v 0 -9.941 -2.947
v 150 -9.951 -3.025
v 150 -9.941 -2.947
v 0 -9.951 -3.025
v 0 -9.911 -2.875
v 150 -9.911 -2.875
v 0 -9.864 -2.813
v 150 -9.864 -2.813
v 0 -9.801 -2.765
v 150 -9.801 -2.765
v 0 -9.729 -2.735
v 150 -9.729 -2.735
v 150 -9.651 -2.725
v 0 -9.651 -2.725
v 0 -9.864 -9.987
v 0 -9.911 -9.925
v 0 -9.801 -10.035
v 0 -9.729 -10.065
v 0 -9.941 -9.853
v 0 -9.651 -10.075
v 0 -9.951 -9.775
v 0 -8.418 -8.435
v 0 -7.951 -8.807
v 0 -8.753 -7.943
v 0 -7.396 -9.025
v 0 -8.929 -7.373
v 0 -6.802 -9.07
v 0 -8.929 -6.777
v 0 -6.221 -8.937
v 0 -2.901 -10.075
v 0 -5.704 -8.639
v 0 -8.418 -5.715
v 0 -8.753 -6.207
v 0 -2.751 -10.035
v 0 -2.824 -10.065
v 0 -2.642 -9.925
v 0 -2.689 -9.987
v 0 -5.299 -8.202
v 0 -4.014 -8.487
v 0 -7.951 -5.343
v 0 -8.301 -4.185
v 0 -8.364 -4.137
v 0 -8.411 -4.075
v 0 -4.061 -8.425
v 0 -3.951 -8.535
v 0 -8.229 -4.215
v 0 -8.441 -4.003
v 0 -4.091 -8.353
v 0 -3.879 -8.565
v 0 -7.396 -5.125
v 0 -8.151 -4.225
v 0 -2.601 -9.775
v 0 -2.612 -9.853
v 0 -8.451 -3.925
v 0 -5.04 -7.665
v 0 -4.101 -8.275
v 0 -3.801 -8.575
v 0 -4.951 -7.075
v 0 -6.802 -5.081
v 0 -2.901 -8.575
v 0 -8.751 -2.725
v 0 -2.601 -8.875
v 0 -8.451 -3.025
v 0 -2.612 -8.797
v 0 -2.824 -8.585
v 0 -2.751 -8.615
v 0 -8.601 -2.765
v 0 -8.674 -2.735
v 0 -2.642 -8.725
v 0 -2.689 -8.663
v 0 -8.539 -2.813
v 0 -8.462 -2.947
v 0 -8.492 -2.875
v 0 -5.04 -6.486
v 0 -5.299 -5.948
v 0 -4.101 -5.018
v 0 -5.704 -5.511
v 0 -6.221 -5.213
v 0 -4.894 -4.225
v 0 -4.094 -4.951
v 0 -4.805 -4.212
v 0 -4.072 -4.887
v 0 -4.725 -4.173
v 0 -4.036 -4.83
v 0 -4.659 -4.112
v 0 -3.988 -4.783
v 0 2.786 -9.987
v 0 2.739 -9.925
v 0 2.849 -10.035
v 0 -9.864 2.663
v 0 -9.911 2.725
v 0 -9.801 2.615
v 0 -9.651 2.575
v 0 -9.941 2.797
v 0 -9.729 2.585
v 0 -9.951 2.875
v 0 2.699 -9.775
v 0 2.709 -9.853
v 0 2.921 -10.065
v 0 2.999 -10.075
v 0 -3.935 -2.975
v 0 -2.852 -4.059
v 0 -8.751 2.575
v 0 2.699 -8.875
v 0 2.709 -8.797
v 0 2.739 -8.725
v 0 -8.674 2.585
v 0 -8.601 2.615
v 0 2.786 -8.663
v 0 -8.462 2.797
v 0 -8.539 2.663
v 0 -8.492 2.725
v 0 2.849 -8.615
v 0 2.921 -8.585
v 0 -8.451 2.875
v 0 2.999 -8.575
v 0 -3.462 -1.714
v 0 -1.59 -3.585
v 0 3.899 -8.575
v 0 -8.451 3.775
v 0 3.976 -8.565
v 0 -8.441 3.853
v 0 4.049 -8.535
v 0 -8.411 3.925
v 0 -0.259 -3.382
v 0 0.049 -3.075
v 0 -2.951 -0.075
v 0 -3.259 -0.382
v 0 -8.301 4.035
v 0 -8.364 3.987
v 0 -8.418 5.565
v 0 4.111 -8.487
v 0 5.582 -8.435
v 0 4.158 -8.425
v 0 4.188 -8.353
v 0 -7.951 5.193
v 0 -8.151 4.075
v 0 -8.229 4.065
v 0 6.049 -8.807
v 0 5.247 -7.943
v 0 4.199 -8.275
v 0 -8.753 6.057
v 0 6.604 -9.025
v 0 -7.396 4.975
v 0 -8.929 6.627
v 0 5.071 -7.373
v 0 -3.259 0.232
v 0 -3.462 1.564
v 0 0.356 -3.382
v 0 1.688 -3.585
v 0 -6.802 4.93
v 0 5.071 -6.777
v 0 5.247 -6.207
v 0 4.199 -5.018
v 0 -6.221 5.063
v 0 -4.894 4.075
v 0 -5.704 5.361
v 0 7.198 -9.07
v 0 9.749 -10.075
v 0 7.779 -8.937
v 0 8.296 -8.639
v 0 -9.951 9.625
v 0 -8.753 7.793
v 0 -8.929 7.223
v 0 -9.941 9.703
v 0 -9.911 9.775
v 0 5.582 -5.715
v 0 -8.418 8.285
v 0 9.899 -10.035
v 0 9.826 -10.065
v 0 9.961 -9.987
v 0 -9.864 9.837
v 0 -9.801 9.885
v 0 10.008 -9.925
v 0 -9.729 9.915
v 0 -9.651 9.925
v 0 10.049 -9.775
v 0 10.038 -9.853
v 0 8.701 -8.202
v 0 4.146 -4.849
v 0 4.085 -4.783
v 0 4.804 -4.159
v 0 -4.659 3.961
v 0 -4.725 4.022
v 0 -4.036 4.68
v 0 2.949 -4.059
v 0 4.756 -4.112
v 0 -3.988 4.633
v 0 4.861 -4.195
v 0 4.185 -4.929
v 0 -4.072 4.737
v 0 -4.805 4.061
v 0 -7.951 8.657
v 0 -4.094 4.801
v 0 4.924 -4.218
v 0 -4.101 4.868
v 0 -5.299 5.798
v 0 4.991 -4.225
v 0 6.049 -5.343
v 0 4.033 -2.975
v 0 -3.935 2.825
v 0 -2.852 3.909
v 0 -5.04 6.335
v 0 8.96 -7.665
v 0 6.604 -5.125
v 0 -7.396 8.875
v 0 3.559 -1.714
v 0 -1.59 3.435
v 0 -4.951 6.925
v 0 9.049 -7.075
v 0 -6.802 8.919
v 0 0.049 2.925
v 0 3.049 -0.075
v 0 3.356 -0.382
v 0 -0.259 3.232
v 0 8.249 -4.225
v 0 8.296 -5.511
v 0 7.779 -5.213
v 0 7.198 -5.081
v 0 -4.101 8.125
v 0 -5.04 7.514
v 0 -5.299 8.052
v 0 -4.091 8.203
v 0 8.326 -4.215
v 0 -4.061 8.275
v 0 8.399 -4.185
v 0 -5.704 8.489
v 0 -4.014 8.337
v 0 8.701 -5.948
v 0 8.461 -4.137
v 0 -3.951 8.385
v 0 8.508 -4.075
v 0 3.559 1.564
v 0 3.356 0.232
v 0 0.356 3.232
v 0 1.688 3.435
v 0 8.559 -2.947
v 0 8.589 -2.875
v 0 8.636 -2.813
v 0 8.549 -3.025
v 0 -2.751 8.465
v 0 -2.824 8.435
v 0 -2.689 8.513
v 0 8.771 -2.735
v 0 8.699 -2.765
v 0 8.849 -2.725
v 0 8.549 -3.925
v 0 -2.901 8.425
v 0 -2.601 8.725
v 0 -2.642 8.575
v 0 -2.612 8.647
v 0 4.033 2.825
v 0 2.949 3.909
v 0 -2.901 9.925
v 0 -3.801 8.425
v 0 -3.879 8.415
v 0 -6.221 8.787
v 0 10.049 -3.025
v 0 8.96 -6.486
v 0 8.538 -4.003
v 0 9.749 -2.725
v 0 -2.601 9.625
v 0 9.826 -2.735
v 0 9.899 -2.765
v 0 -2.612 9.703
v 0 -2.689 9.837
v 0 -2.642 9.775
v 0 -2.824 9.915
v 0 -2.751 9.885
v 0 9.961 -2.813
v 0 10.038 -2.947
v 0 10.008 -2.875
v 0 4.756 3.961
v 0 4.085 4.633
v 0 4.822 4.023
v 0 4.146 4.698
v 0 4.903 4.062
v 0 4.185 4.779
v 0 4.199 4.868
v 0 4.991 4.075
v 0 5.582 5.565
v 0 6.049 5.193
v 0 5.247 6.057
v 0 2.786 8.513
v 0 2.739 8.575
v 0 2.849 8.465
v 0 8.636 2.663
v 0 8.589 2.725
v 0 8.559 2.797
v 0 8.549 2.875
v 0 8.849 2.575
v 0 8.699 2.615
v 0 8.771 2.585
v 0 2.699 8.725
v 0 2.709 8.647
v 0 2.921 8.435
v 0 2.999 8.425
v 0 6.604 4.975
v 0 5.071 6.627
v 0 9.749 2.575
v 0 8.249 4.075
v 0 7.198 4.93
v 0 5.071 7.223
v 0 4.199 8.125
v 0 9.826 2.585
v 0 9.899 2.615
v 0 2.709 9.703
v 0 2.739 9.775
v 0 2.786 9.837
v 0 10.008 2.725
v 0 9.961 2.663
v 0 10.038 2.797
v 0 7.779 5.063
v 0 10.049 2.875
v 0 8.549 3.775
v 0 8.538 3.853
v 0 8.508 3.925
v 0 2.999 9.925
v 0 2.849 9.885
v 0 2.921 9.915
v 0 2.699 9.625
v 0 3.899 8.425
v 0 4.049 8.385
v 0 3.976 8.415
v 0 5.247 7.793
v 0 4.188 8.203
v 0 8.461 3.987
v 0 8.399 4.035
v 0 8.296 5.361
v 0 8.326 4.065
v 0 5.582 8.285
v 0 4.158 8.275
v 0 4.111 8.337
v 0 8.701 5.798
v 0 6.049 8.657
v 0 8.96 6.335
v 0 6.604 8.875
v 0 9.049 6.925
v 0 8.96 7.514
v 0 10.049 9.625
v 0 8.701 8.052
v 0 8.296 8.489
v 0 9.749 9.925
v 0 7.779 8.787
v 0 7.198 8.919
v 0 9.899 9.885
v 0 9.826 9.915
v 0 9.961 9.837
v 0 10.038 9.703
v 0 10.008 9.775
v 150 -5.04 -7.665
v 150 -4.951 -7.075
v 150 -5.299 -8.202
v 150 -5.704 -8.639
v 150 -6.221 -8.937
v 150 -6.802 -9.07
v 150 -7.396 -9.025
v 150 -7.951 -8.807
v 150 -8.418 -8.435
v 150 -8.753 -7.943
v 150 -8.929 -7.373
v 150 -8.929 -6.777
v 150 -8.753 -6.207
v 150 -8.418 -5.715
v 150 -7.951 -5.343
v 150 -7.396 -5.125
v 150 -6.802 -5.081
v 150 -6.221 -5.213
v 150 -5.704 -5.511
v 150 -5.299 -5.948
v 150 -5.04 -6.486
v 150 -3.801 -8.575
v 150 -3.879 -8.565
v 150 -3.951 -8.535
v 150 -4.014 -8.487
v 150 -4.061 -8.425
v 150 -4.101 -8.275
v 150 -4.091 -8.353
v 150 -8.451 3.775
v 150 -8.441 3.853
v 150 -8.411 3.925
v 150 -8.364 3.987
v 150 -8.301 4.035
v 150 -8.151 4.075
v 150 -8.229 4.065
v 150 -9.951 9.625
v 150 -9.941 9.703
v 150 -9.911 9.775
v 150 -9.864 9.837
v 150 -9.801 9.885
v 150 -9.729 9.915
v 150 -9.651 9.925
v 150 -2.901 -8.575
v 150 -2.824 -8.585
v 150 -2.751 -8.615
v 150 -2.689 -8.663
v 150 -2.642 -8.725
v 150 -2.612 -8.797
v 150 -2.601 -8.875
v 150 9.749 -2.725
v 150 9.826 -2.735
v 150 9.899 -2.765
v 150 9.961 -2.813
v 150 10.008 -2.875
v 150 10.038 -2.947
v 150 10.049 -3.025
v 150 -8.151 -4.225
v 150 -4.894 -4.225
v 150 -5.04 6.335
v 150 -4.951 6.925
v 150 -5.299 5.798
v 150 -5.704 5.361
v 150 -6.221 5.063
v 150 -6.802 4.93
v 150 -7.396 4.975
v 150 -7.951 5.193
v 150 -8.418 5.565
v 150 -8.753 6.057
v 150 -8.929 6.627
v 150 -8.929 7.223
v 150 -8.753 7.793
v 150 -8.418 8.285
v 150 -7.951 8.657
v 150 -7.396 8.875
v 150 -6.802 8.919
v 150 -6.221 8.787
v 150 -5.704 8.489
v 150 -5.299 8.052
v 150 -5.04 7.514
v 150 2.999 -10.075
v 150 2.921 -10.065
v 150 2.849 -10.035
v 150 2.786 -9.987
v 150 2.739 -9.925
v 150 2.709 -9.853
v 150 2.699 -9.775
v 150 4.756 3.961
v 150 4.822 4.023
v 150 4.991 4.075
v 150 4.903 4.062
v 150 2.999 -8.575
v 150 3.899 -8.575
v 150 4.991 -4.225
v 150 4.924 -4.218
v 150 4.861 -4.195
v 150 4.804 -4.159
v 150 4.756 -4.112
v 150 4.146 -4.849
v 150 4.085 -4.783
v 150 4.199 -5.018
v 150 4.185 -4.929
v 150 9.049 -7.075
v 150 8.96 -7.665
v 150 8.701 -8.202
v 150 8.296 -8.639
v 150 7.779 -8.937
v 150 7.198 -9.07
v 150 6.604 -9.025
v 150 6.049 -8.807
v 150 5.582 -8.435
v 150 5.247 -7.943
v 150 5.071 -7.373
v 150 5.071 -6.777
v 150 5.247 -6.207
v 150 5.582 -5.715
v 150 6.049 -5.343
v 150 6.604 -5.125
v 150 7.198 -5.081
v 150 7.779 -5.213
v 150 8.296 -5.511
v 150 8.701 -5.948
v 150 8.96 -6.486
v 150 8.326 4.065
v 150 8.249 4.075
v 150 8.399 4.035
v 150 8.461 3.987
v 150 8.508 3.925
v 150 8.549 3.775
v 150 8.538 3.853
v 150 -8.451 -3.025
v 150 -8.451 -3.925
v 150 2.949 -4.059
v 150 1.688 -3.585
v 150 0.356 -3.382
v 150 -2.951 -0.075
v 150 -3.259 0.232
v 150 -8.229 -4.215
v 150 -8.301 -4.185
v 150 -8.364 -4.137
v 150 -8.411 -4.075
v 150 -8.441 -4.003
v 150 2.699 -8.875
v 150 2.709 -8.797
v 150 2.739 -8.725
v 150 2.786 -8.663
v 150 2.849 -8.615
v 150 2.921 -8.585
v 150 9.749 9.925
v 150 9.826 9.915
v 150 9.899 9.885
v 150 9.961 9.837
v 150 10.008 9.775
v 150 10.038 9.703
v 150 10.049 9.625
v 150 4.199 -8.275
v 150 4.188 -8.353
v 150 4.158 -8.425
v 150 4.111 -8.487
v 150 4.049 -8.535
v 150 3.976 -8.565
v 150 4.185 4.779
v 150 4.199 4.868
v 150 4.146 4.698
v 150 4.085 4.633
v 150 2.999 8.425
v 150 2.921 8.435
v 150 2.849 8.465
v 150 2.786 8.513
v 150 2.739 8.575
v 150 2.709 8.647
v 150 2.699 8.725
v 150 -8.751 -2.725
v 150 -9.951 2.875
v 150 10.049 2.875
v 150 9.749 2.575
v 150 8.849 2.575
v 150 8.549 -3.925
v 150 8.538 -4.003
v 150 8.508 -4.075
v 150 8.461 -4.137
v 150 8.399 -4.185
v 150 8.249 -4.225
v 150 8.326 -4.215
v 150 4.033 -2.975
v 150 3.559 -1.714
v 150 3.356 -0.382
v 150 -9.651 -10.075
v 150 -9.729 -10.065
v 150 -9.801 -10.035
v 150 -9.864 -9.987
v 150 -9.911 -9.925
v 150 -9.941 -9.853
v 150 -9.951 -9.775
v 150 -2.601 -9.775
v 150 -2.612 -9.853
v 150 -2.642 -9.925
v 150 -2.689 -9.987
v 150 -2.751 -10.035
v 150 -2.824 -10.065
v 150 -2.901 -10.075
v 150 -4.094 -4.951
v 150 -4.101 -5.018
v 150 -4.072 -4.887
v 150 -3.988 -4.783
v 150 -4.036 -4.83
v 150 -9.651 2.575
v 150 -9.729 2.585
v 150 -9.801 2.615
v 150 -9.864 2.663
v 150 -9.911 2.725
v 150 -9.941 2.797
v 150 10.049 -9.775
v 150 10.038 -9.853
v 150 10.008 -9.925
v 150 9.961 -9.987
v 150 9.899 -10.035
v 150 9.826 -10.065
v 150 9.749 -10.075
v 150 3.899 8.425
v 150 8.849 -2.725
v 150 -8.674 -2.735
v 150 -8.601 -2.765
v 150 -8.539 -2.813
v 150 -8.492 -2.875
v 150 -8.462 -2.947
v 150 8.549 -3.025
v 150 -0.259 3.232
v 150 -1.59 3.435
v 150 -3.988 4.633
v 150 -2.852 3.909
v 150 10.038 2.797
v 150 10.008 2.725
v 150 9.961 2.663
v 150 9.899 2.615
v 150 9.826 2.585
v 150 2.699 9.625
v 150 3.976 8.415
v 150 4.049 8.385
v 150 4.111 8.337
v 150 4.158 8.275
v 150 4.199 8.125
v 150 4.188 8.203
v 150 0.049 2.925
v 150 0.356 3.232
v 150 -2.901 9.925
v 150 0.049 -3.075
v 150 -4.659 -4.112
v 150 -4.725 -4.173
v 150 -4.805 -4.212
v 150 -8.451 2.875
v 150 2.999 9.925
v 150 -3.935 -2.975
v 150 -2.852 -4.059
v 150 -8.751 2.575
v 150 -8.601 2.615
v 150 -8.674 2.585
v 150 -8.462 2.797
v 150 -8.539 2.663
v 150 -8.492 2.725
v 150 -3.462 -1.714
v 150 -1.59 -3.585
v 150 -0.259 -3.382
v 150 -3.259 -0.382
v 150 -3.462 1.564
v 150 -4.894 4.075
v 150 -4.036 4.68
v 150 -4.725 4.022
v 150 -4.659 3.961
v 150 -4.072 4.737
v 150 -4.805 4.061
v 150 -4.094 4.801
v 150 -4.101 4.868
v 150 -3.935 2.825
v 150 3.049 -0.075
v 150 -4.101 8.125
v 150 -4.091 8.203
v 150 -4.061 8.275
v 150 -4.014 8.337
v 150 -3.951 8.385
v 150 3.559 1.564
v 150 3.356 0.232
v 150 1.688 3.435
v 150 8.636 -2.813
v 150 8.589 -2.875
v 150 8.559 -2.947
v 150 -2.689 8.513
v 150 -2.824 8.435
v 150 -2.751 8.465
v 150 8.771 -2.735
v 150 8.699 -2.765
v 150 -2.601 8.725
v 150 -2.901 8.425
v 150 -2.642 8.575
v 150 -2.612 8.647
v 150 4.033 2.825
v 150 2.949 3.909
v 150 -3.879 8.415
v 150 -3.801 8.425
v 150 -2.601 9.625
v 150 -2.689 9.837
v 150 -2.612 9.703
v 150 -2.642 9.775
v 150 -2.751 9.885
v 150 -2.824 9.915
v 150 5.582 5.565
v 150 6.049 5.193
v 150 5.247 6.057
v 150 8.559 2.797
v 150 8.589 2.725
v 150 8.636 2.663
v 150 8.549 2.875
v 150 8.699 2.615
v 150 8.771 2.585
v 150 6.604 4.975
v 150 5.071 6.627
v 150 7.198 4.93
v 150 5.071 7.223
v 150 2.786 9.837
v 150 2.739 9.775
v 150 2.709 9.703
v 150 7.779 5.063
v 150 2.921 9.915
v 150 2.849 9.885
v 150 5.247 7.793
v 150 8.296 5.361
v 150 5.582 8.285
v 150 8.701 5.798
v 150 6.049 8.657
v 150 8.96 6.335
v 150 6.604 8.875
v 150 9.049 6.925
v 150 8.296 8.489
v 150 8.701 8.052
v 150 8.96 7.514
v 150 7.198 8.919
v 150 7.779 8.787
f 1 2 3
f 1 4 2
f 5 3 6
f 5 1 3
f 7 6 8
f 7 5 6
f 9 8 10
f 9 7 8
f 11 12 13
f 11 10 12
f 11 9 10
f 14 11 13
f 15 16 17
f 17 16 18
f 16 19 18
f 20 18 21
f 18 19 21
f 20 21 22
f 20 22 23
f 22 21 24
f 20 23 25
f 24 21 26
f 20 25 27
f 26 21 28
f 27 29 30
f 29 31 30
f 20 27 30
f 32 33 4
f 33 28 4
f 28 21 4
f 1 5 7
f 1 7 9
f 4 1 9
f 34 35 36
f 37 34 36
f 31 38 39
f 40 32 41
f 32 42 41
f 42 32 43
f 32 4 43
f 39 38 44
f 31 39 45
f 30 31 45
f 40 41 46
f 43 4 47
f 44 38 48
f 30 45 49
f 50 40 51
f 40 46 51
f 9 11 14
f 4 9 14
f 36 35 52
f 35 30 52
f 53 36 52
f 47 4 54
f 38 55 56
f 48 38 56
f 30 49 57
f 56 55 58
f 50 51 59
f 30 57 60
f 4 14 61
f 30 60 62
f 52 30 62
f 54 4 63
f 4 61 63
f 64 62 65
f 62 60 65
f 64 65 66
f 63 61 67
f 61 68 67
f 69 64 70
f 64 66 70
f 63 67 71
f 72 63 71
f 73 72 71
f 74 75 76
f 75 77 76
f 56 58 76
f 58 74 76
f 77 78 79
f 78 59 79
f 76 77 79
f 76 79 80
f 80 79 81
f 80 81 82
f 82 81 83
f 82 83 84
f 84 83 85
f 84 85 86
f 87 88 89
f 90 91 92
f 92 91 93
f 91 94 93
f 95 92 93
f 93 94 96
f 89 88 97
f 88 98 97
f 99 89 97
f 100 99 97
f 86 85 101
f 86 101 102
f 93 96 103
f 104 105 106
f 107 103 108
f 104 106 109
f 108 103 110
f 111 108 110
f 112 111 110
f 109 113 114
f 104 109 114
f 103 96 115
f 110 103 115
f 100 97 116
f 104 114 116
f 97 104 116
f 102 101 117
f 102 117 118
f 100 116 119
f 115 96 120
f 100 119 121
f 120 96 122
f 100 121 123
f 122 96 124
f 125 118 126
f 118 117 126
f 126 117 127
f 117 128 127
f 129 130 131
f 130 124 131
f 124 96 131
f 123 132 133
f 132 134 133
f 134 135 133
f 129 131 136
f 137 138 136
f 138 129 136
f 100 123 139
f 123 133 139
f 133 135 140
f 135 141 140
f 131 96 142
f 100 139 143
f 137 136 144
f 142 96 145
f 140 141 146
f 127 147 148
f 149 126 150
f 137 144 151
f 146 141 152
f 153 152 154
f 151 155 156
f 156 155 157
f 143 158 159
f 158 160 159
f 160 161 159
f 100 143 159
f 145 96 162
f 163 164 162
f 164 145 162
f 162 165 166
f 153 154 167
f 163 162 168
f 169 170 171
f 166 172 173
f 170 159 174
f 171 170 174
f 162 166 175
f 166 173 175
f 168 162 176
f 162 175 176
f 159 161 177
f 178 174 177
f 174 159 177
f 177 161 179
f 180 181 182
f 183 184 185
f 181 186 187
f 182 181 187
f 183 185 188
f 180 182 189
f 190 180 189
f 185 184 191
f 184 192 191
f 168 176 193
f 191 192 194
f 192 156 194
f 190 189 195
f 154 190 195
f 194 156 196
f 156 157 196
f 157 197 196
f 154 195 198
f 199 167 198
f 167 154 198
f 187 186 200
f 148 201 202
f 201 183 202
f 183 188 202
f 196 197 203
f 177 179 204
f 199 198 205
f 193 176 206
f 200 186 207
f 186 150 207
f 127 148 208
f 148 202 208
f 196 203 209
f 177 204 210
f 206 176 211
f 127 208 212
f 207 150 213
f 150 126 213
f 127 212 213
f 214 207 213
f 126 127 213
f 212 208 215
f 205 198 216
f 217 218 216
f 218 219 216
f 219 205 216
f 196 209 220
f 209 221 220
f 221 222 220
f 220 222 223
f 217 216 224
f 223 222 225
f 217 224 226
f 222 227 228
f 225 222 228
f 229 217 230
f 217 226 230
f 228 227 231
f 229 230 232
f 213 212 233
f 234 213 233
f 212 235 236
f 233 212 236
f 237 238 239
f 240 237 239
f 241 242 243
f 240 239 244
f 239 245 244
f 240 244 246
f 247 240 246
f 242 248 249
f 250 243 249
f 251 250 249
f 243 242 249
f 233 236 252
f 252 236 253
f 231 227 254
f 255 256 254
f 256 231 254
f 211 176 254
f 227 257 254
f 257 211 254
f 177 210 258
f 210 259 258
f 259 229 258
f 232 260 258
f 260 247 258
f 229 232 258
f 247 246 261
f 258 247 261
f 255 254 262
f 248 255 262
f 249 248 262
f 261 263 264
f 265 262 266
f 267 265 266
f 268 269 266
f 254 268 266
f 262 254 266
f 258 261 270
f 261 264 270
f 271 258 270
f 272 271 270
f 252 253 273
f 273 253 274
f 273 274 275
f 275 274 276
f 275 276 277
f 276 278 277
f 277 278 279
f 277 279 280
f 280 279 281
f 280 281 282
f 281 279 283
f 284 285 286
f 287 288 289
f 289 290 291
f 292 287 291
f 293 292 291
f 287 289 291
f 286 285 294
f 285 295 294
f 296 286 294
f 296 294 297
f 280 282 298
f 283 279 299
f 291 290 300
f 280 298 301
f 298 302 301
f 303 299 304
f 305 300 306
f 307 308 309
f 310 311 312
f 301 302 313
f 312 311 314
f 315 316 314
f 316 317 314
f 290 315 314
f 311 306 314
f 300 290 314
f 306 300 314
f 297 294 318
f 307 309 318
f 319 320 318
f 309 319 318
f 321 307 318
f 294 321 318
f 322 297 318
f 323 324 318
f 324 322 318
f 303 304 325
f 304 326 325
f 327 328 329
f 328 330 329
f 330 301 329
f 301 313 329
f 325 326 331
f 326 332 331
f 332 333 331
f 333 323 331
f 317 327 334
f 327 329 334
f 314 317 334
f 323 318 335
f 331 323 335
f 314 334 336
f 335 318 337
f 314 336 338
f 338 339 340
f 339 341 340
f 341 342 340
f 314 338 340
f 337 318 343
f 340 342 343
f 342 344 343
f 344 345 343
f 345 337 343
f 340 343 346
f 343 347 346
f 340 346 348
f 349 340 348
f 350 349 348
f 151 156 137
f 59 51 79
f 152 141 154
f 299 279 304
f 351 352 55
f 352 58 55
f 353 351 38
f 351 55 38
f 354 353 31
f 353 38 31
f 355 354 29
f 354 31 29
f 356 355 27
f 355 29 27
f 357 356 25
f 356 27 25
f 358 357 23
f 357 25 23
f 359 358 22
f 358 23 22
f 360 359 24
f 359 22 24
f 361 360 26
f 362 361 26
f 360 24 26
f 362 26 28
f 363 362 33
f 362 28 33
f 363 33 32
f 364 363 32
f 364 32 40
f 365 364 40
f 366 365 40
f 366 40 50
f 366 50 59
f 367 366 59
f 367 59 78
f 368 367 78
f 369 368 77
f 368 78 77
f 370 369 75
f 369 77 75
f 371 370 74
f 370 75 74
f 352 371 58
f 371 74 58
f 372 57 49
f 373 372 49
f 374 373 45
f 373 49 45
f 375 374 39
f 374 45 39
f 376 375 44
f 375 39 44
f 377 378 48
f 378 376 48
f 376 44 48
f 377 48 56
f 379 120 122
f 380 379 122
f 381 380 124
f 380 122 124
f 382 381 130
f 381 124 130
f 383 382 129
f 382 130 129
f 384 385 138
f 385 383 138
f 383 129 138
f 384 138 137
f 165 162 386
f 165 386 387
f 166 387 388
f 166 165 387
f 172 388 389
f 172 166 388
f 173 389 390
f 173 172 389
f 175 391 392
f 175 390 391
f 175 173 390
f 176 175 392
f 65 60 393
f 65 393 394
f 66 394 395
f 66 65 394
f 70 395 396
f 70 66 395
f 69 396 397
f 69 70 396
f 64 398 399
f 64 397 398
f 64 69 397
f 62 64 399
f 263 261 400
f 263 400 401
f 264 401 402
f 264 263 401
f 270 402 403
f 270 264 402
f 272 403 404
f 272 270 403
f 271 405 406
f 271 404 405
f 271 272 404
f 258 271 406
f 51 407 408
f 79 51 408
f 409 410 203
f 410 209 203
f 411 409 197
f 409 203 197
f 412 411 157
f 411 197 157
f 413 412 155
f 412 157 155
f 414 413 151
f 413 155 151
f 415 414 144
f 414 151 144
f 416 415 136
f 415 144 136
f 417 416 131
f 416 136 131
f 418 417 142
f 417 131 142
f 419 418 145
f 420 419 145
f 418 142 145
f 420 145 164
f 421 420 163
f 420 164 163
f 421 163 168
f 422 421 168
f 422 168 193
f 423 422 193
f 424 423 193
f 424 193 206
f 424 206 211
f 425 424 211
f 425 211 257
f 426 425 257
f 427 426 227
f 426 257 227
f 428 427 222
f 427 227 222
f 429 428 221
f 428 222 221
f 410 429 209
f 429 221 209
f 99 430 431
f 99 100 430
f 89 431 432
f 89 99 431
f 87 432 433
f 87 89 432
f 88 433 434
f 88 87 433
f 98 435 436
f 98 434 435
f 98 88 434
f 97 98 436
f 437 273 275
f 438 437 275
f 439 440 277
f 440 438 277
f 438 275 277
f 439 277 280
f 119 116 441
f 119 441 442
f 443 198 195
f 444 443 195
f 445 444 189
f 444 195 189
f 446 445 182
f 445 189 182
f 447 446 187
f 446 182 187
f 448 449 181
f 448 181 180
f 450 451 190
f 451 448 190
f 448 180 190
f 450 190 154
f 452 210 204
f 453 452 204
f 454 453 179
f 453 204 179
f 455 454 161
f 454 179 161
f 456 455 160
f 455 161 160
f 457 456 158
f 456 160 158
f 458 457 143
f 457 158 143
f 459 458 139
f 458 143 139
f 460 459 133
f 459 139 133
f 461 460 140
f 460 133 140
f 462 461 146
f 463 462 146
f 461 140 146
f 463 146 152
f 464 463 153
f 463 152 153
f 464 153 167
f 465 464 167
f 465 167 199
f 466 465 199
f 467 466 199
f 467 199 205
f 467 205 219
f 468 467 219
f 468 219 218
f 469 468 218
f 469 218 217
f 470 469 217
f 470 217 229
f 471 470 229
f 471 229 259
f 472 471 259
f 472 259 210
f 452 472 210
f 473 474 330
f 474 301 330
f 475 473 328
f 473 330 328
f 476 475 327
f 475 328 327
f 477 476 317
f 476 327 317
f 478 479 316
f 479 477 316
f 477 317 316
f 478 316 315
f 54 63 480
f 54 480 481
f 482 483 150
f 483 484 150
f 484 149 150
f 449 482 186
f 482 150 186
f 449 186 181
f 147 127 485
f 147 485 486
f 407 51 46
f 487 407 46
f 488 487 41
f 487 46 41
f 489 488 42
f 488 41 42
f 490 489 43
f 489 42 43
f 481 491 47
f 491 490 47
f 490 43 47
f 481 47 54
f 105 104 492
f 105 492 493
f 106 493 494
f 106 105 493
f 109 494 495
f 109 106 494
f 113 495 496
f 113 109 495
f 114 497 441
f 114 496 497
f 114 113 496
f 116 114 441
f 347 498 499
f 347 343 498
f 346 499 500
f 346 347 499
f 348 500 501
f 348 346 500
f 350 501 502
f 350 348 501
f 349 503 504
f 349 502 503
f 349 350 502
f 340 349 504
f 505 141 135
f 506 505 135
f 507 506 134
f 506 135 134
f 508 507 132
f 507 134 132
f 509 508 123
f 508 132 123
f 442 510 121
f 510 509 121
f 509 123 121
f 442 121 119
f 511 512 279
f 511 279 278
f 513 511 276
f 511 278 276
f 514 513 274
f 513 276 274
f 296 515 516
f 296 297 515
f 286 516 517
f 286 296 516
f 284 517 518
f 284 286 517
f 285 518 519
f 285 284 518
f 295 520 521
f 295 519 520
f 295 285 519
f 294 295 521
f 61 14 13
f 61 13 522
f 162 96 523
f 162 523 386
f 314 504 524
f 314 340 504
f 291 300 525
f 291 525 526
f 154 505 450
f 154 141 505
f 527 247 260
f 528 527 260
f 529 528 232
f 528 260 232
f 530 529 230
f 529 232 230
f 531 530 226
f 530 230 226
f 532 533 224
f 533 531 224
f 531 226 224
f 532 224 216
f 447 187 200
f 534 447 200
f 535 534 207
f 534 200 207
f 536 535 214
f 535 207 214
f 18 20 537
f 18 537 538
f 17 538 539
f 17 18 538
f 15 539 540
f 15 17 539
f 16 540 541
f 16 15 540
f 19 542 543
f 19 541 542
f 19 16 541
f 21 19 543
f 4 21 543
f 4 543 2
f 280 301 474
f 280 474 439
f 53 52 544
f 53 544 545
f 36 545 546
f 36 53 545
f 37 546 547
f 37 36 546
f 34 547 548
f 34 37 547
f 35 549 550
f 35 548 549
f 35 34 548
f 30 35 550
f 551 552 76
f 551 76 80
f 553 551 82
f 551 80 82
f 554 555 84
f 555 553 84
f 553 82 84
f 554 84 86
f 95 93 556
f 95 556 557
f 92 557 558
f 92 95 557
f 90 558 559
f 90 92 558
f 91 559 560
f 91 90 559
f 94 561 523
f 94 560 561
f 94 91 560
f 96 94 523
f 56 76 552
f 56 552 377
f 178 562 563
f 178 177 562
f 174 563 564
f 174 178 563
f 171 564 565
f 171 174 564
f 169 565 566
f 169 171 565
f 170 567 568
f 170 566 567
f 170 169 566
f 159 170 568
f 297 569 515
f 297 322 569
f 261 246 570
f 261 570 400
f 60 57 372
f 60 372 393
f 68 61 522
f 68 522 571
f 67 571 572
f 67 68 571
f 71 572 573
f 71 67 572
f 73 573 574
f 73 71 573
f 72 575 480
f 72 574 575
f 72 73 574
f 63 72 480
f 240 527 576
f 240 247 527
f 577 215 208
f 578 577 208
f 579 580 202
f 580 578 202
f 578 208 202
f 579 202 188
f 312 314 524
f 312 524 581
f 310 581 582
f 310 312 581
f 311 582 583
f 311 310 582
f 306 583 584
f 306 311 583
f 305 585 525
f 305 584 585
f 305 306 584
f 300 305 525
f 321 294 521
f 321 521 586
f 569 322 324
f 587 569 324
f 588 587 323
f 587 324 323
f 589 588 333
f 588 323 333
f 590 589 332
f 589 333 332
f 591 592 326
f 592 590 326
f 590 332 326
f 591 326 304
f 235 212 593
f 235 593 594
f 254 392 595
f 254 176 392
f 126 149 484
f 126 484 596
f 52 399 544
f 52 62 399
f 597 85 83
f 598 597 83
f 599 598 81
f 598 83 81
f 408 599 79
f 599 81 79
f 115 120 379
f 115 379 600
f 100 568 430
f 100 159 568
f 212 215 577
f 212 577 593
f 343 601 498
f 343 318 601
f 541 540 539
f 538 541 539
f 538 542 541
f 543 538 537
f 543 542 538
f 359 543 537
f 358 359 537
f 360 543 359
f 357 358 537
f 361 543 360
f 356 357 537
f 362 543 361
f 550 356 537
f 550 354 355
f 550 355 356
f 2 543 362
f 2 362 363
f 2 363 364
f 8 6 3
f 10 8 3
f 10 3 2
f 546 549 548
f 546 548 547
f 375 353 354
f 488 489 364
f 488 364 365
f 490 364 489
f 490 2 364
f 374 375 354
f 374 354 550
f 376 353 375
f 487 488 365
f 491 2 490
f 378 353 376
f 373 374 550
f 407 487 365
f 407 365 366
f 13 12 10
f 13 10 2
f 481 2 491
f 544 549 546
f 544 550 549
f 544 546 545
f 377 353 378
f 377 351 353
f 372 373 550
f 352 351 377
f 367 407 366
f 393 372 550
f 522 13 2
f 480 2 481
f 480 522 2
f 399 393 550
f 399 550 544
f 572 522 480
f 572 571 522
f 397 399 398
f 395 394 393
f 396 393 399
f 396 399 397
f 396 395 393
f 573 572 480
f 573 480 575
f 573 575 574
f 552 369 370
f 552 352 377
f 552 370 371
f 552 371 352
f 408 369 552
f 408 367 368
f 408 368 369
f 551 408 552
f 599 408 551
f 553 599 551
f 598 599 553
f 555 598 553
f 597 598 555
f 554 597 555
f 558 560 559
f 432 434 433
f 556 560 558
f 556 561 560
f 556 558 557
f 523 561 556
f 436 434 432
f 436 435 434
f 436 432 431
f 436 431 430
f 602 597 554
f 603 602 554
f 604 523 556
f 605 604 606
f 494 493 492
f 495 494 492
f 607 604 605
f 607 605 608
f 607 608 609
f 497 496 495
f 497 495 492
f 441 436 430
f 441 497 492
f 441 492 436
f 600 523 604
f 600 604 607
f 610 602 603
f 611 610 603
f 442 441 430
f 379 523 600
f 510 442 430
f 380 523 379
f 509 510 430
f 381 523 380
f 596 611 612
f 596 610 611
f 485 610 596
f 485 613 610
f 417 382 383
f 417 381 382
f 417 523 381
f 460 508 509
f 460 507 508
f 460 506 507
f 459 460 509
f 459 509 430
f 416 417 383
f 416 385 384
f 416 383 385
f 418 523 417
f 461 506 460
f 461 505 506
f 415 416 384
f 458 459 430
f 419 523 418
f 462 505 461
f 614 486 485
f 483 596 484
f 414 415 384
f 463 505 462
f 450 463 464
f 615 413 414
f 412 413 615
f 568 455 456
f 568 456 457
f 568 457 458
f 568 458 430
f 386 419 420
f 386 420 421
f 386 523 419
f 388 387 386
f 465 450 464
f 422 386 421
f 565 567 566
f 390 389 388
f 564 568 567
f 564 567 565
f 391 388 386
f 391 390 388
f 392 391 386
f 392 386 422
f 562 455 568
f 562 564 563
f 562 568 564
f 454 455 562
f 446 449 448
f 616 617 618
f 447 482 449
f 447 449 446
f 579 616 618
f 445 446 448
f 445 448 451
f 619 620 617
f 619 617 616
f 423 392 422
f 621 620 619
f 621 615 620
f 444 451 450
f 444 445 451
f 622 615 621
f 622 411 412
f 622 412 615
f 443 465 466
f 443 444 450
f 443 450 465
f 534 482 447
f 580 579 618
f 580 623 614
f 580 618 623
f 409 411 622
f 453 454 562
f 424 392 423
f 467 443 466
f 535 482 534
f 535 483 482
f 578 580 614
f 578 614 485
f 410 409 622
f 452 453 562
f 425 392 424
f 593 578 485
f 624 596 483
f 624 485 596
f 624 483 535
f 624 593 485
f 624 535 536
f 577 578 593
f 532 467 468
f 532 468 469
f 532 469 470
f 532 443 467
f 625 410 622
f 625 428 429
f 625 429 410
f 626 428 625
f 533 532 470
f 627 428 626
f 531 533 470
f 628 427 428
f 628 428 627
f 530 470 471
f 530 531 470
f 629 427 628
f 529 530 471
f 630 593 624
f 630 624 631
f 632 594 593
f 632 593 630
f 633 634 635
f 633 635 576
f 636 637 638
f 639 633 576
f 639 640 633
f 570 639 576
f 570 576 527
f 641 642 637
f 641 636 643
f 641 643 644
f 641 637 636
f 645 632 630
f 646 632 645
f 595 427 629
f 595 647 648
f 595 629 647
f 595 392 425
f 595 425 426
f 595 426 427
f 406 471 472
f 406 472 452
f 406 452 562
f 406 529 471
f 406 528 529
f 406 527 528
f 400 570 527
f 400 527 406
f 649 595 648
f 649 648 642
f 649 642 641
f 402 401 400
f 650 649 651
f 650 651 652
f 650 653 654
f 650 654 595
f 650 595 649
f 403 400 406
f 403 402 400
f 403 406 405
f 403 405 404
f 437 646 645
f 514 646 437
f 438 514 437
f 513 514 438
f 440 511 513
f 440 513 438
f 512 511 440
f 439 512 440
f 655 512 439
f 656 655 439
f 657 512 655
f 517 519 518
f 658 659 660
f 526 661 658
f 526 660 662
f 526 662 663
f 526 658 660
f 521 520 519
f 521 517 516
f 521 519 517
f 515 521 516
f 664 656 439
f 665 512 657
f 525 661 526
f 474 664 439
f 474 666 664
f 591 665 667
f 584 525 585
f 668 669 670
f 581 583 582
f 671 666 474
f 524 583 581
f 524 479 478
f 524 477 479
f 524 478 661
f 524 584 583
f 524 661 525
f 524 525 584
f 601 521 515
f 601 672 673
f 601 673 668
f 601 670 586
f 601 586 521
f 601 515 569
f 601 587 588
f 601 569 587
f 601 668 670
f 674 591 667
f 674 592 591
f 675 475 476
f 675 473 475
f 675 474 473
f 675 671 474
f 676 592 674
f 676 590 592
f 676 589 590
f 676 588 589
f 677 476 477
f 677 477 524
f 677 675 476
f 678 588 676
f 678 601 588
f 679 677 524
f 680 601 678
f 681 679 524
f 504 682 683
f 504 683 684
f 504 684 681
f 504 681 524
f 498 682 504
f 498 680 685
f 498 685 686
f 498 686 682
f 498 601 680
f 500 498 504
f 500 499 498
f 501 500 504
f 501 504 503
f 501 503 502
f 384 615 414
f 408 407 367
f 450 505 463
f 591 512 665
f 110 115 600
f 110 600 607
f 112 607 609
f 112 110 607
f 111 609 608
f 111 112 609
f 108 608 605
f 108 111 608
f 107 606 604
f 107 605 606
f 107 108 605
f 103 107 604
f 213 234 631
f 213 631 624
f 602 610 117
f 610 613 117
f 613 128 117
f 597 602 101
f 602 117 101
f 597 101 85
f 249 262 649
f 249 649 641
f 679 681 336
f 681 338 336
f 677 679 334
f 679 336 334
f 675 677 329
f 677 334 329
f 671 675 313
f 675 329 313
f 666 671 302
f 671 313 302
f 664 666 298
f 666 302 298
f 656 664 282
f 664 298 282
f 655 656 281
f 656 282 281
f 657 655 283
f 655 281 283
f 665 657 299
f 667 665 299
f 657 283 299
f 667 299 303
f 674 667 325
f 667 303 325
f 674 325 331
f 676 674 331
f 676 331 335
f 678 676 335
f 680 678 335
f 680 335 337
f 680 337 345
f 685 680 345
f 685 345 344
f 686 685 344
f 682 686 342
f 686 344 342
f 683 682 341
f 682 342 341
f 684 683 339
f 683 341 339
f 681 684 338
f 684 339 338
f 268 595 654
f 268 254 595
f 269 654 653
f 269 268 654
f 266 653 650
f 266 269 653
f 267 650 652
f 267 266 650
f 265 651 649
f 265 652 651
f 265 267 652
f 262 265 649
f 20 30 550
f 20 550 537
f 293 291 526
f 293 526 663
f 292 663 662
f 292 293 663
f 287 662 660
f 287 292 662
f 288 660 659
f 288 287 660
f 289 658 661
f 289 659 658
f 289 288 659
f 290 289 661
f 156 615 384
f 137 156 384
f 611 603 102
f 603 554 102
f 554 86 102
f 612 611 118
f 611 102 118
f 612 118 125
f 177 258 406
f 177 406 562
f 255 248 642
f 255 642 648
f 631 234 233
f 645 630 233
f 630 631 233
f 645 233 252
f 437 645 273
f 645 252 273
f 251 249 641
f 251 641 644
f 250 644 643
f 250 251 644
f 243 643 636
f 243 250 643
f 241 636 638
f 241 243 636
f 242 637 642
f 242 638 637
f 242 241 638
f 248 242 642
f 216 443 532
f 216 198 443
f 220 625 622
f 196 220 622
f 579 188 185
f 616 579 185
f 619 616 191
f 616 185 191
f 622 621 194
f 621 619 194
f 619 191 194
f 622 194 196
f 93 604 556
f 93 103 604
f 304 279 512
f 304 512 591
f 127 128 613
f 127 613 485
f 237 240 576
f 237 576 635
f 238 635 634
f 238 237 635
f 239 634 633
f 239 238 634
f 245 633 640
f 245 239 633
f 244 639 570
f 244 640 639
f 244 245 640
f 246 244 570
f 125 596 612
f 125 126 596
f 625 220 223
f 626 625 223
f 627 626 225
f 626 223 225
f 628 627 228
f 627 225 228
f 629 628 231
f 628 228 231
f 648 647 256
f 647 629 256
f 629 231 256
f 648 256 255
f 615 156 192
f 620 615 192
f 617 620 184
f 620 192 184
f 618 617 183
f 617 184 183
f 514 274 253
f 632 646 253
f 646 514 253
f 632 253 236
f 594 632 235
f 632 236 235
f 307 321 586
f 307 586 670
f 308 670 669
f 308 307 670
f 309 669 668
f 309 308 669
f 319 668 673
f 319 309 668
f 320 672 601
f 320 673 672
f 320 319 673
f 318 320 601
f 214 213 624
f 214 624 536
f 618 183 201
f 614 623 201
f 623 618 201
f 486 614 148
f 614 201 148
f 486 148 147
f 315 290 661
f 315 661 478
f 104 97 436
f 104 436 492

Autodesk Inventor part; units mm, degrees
ref_plane "YZ Plane" through (0, 0, 0) normal (1, 0, 0) x (0, 1, 0)
ref_plane "XZ Plane" through (0, 0, 0) normal (0, 1, 0) x (-1, 0, 0)
ref_plane "XY Plane" through (0, 0, 0) normal (0, 0, 1) x (1, 0, 0)
sketch "Sketch1" plane through (0, 0, 0) normal (1, 0, 0) x (0, 1, 0)
  line L0 (9.5486, -7.0751) -> (4.5486, -7.0751)
  line L1 (7.0486, -9.5751) -> (7.0486, -4.5751)
  circle A0 centre (7.0486, -7.0751) radius 2
  circle A1 centre (7.0486, 6.9249) radius 2
  line L2 (7.0486, 9.4249) -> (7.0486, 4.4249)
  line L3 (9.5486, 6.9249) -> (4.5486, 6.9249)
  line L4 (4.1986, 4.8676) -> (4.1986, 8.1249)
  arc A2 (4.1986, 8.1249) -> (3.8986, 8.4249) centre (3.8986, 8.1249) ccw
  line L5 (3.8986, 8.4249) -> (2.9986, 8.4249)
  arc A3 (2.6986, 8.7249) -> (2.9986, 8.4249) centre (2.9986, 8.7249) ccw
  line L6 (2.6986, 8.7249) -> (2.6986, 9.6249)
  arc A4 (2.9986, 9.9249) -> (2.6986, 9.6249) centre (2.9986, 9.6249) ccw
  line L7 (2.9986, 9.9249) -> (9.7486, 9.9249)
  arc A5 (10.0486, 9.6249) -> (9.7486, 9.9249) centre (9.7486, 9.6249) ccw
  line L8 (10.0486, 9.6249) -> (10.0486, 2.8749)
  arc A6 (9.7486, 2.5749) -> (10.0486, 2.8749) centre (9.7486, 2.8749) ccw
  line L9 (9.7486, 2.5749) -> (8.8486, 2.5749)
  arc A7 (8.5486, 2.8749) -> (8.8486, 2.5749) centre (8.8486, 2.8749) ccw
  line L10 (8.5486, 2.8749) -> (8.5486, 3.7749)
  arc A8 (8.5486, 3.7749) -> (8.2486, 4.0749) centre (8.2486, 3.7749) ccw
  line L11 (8.2486, 4.0749) -> (4.9914, 4.0749)
  arc A9 (4.9914, 4.0749) -> (4.7564, 3.9614) centre (4.9914, 3.7749) ccw
  arc A10 (4.7564, 3.9614) -> (3.3559, 0.2322) centre (9.8395, -0.0751) ccw
  line L12 (3.3559, 0.2322) -> (3.0486, -0.0751)
  line L13 (3.0486, -0.0751) -> (3.3559, -0.3824)
  arc A11 (3.3559, -0.3824) -> (4.7564, -4.1117) centre (9.8395, -0.0751) ccw
  arc A12 (4.7564, -4.1117) -> (4.9914, -4.2251) centre (4.9914, -3.9251) ccw
  line L14 (4.9914, -4.2251) -> (8.2486, -4.2251)
  arc A13 (8.2486, -4.2251) -> (8.5486, -3.9251) centre (8.2486, -3.9251) ccw
  line L15 (8.5486, -3.9251) -> (8.5486, -3.0251)
  arc A14 (8.8486, -2.7251) -> (8.5486, -3.0251) centre (8.8486, -3.0251) ccw
  line L16 (8.8486, -2.7251) -> (9.7486, -2.7251)
  arc A15 (10.0486, -3.0251) -> (9.7486, -2.7251) centre (9.7486, -3.0251) ccw
  line L17 (10.0486, -3.0251) -> (10.0486, -9.7751)
  arc A16 (9.7486, -10.0751) -> (10.0486, -9.7751) centre (9.7486, -9.7751) ccw
  line L18 (9.7486, -10.0751) -> (2.9986, -10.0751)
  arc A17 (2.6986, -9.7751) -> (2.9986, -10.0751) centre (2.9986, -9.7751) ccw
  line L19 (2.6986, -9.7751) -> (2.6986, -8.8751)
  arc A18 (2.9986, -8.5751) -> (2.6986, -8.8751) centre (2.9986, -8.8751) ccw
  line L20 (2.9986, -8.5751) -> (3.8986, -8.5751)
  arc A19 (3.8986, -8.5751) -> (4.1986, -8.2751) centre (3.8986, -8.2751) ccw
  line L21 (4.1986, -8.2751) -> (4.1986, -5.0179)
  arc A20 (4.1986, -5.0179) -> (4.0852, -4.7829) centre (3.8986, -5.0179) ccw
  arc A21 (4.0852, -4.7829) -> (0.3559, -3.3824) centre (0.0486, -9.8659) ccw
  line L22 (0.3559, -3.3824) -> (0.0486, -3.0751)
  line L23 (0.0486, -3.0751) -> (-0.2587, -3.3824)
  arc A22 (-0.2587, -3.3824) -> (-3.9879, -4.7829) centre (0.0486, -9.8659) ccw
  arc A23 (-3.9879, -4.7829) -> (-4.1014, -5.0179) centre (-3.8014, -5.0179) ccw
  line L24 (-4.1014, -5.0179) -> (-4.1014, -8.2751)
  arc A24 (-4.1014, -8.2751) -> (-3.8014, -8.5751) centre (-3.8014, -8.2751) ccw
  line L25 (-3.8014, -8.5751) -> (-2.9014, -8.5751)
  arc A25 (-2.6014, -8.8751) -> (-2.9014, -8.5751) centre (-2.9014, -8.8751) ccw
  line L26 (-2.6014, -8.8751) -> (-2.6014, -9.7751)
  arc A26 (-2.9014, -10.0751) -> (-2.6014, -9.7751) centre (-2.9014, -9.7751) ccw
  line L27 (-2.9014, -10.0751) -> (-9.6514, -10.0751)
  arc A27 (-9.9514, -9.7751) -> (-9.6514, -10.0751) centre (-9.6514, -9.7751) ccw
  line L28 (-9.9514, -9.7751) -> (-9.9514, -3.0251)
  arc A28 (-9.6514, -2.7251) -> (-9.9514, -3.0251) centre (-9.6514, -3.0251) ccw
  line L29 (-9.6514, -2.7251) -> (-8.7514, -2.7251)
  arc A29 (-8.4514, -3.0251) -> (-8.7514, -2.7251) centre (-8.7514, -3.0251) ccw
  line L30 (-8.4514, -3.0251) -> (-8.4514, -3.9251)
  arc A30 (-8.4514, -3.9251) -> (-8.1514, -4.2251) centre (-8.1514, -3.9251) ccw
  line L31 (-8.1514, -4.2251) -> (-4.8941, -4.2251)
  arc A31 (-4.8941, -4.2251) -> (-4.6592, -4.1117) centre (-4.8941, -3.9251) ccw
  arc A32 (-4.6592, -4.1117) -> (-3.2587, -0.3824) centre (-9.7422, -0.0751) ccw
  line L32 (-3.2587, -0.3824) -> (-2.9514, -0.0751)
  line L33 (-2.9514, -0.0751) -> (-3.2587, 0.2322)
  arc A33 (-3.2587, 0.2322) -> (-4.6592, 3.9614) centre (-9.7422, -0.0751) ccw
  arc A34 (-4.6592, 3.9614) -> (-4.8941, 4.0749) centre (-4.8941, 3.7749) ccw
  line L34 (-4.8941, 4.0749) -> (-8.1514, 4.0749)
  arc A35 (-8.1514, 4.0749) -> (-8.4514, 3.7749) centre (-8.1514, 3.7749) ccw
  line L35 (-8.4514, 3.7749) -> (-8.4514, 2.8749)
  arc A36 (-8.7514, 2.5749) -> (-8.4514, 2.8749) centre (-8.7514, 2.8749) ccw
  line L36 (-8.7514, 2.5749) -> (-9.6514, 2.5749)
  arc A37 (-9.9514, 2.8749) -> (-9.6514, 2.5749) centre (-9.6514, 2.8749) ccw
  line L37 (-9.9514, 2.8749) -> (-9.9514, 9.6249)
  arc A38 (-9.6514, 9.9249) -> (-9.9514, 9.6249) centre (-9.6514, 9.6249) ccw
  line L38 (-9.6514, 9.9249) -> (-2.9014, 9.9249)
  arc A39 (-2.6014, 9.6249) -> (-2.9014, 9.9249) centre (-2.9014, 9.6249) ccw
  line L39 (-2.6014, 9.6249) -> (-2.6014, 8.7249)
  arc A40 (-2.9014, 8.4249) -> (-2.6014, 8.7249) centre (-2.9014, 8.7249) ccw
  line L40 (-2.9014, 8.4249) -> (-3.8014, 8.4249)
  arc A41 (-3.8014, 8.4249) -> (-4.1014, 8.1249) centre (-3.8014, 8.1249) ccw
  line L41 (-4.1014, 8.1249) -> (-4.1014, 4.8676)
  arc A42 (-4.1014, 4.8676) -> (-3.9879, 4.6327) centre (-3.8014, 4.8676) ccw
  arc A43 (-3.9879, 4.6327) -> (-0.2587, 3.2322) centre (0.0486, 9.7157) ccw
  line L42 (-0.2587, 3.2322) -> (0.0486, 2.9249)
  line L43 (0.0486, 2.9249) -> (0.3559, 3.2322)
  arc A44 (0.3559, 3.2322) -> (4.0852, 4.6327) centre (0.0486, 9.7157) ccw
  arc A45 (4.0852, 4.6327) -> (4.1986, 4.8676) centre (3.8986, 4.8676) ccw
  line L44 (-11.1503, -0.0751) -> (11.2475, -0.0751)
  circle A46 centre (0.0486, -0.0751) radius 2.15
  circle A47 centre (-6.9514, -7.0751) radius 2
  line L45 (-6.9514, -9.5751) -> (-6.9514, -4.5751)
  line L46 (-9.4514, -7.0751) -> (-4.4514, -7.0751)
  circle A48 centre (-6.9514, 6.9249) radius 2
  line L47 (-6.9514, 9.4249) -> (-6.9514, 4.4249)
  line L48 (-9.4514, 6.9249) -> (-4.4514, 6.9249)
extrude "Extrusion1" add sketch "Sketch1" along normal blind 150
equation "\"BendRadius\" = Thickness"
equation "\"BendReliefWidth\" = Thickness"
equation "\"BendReliefDepth\" = 0.5 * Thickness"
equation "\"CornerReliefSize\" = 4 * Thickness"
equation "\"MinimumRemnant\" = 2 * Thickness"
equation "\"TransitionRadius\" = BendRadius"
equation "\"JacobiRadiusSize\" = BendRadius"
equation "\"GapSize\" = Thickness"
equation "\"Thickness\" = 3.048"
properties part number "150mm 2020"
